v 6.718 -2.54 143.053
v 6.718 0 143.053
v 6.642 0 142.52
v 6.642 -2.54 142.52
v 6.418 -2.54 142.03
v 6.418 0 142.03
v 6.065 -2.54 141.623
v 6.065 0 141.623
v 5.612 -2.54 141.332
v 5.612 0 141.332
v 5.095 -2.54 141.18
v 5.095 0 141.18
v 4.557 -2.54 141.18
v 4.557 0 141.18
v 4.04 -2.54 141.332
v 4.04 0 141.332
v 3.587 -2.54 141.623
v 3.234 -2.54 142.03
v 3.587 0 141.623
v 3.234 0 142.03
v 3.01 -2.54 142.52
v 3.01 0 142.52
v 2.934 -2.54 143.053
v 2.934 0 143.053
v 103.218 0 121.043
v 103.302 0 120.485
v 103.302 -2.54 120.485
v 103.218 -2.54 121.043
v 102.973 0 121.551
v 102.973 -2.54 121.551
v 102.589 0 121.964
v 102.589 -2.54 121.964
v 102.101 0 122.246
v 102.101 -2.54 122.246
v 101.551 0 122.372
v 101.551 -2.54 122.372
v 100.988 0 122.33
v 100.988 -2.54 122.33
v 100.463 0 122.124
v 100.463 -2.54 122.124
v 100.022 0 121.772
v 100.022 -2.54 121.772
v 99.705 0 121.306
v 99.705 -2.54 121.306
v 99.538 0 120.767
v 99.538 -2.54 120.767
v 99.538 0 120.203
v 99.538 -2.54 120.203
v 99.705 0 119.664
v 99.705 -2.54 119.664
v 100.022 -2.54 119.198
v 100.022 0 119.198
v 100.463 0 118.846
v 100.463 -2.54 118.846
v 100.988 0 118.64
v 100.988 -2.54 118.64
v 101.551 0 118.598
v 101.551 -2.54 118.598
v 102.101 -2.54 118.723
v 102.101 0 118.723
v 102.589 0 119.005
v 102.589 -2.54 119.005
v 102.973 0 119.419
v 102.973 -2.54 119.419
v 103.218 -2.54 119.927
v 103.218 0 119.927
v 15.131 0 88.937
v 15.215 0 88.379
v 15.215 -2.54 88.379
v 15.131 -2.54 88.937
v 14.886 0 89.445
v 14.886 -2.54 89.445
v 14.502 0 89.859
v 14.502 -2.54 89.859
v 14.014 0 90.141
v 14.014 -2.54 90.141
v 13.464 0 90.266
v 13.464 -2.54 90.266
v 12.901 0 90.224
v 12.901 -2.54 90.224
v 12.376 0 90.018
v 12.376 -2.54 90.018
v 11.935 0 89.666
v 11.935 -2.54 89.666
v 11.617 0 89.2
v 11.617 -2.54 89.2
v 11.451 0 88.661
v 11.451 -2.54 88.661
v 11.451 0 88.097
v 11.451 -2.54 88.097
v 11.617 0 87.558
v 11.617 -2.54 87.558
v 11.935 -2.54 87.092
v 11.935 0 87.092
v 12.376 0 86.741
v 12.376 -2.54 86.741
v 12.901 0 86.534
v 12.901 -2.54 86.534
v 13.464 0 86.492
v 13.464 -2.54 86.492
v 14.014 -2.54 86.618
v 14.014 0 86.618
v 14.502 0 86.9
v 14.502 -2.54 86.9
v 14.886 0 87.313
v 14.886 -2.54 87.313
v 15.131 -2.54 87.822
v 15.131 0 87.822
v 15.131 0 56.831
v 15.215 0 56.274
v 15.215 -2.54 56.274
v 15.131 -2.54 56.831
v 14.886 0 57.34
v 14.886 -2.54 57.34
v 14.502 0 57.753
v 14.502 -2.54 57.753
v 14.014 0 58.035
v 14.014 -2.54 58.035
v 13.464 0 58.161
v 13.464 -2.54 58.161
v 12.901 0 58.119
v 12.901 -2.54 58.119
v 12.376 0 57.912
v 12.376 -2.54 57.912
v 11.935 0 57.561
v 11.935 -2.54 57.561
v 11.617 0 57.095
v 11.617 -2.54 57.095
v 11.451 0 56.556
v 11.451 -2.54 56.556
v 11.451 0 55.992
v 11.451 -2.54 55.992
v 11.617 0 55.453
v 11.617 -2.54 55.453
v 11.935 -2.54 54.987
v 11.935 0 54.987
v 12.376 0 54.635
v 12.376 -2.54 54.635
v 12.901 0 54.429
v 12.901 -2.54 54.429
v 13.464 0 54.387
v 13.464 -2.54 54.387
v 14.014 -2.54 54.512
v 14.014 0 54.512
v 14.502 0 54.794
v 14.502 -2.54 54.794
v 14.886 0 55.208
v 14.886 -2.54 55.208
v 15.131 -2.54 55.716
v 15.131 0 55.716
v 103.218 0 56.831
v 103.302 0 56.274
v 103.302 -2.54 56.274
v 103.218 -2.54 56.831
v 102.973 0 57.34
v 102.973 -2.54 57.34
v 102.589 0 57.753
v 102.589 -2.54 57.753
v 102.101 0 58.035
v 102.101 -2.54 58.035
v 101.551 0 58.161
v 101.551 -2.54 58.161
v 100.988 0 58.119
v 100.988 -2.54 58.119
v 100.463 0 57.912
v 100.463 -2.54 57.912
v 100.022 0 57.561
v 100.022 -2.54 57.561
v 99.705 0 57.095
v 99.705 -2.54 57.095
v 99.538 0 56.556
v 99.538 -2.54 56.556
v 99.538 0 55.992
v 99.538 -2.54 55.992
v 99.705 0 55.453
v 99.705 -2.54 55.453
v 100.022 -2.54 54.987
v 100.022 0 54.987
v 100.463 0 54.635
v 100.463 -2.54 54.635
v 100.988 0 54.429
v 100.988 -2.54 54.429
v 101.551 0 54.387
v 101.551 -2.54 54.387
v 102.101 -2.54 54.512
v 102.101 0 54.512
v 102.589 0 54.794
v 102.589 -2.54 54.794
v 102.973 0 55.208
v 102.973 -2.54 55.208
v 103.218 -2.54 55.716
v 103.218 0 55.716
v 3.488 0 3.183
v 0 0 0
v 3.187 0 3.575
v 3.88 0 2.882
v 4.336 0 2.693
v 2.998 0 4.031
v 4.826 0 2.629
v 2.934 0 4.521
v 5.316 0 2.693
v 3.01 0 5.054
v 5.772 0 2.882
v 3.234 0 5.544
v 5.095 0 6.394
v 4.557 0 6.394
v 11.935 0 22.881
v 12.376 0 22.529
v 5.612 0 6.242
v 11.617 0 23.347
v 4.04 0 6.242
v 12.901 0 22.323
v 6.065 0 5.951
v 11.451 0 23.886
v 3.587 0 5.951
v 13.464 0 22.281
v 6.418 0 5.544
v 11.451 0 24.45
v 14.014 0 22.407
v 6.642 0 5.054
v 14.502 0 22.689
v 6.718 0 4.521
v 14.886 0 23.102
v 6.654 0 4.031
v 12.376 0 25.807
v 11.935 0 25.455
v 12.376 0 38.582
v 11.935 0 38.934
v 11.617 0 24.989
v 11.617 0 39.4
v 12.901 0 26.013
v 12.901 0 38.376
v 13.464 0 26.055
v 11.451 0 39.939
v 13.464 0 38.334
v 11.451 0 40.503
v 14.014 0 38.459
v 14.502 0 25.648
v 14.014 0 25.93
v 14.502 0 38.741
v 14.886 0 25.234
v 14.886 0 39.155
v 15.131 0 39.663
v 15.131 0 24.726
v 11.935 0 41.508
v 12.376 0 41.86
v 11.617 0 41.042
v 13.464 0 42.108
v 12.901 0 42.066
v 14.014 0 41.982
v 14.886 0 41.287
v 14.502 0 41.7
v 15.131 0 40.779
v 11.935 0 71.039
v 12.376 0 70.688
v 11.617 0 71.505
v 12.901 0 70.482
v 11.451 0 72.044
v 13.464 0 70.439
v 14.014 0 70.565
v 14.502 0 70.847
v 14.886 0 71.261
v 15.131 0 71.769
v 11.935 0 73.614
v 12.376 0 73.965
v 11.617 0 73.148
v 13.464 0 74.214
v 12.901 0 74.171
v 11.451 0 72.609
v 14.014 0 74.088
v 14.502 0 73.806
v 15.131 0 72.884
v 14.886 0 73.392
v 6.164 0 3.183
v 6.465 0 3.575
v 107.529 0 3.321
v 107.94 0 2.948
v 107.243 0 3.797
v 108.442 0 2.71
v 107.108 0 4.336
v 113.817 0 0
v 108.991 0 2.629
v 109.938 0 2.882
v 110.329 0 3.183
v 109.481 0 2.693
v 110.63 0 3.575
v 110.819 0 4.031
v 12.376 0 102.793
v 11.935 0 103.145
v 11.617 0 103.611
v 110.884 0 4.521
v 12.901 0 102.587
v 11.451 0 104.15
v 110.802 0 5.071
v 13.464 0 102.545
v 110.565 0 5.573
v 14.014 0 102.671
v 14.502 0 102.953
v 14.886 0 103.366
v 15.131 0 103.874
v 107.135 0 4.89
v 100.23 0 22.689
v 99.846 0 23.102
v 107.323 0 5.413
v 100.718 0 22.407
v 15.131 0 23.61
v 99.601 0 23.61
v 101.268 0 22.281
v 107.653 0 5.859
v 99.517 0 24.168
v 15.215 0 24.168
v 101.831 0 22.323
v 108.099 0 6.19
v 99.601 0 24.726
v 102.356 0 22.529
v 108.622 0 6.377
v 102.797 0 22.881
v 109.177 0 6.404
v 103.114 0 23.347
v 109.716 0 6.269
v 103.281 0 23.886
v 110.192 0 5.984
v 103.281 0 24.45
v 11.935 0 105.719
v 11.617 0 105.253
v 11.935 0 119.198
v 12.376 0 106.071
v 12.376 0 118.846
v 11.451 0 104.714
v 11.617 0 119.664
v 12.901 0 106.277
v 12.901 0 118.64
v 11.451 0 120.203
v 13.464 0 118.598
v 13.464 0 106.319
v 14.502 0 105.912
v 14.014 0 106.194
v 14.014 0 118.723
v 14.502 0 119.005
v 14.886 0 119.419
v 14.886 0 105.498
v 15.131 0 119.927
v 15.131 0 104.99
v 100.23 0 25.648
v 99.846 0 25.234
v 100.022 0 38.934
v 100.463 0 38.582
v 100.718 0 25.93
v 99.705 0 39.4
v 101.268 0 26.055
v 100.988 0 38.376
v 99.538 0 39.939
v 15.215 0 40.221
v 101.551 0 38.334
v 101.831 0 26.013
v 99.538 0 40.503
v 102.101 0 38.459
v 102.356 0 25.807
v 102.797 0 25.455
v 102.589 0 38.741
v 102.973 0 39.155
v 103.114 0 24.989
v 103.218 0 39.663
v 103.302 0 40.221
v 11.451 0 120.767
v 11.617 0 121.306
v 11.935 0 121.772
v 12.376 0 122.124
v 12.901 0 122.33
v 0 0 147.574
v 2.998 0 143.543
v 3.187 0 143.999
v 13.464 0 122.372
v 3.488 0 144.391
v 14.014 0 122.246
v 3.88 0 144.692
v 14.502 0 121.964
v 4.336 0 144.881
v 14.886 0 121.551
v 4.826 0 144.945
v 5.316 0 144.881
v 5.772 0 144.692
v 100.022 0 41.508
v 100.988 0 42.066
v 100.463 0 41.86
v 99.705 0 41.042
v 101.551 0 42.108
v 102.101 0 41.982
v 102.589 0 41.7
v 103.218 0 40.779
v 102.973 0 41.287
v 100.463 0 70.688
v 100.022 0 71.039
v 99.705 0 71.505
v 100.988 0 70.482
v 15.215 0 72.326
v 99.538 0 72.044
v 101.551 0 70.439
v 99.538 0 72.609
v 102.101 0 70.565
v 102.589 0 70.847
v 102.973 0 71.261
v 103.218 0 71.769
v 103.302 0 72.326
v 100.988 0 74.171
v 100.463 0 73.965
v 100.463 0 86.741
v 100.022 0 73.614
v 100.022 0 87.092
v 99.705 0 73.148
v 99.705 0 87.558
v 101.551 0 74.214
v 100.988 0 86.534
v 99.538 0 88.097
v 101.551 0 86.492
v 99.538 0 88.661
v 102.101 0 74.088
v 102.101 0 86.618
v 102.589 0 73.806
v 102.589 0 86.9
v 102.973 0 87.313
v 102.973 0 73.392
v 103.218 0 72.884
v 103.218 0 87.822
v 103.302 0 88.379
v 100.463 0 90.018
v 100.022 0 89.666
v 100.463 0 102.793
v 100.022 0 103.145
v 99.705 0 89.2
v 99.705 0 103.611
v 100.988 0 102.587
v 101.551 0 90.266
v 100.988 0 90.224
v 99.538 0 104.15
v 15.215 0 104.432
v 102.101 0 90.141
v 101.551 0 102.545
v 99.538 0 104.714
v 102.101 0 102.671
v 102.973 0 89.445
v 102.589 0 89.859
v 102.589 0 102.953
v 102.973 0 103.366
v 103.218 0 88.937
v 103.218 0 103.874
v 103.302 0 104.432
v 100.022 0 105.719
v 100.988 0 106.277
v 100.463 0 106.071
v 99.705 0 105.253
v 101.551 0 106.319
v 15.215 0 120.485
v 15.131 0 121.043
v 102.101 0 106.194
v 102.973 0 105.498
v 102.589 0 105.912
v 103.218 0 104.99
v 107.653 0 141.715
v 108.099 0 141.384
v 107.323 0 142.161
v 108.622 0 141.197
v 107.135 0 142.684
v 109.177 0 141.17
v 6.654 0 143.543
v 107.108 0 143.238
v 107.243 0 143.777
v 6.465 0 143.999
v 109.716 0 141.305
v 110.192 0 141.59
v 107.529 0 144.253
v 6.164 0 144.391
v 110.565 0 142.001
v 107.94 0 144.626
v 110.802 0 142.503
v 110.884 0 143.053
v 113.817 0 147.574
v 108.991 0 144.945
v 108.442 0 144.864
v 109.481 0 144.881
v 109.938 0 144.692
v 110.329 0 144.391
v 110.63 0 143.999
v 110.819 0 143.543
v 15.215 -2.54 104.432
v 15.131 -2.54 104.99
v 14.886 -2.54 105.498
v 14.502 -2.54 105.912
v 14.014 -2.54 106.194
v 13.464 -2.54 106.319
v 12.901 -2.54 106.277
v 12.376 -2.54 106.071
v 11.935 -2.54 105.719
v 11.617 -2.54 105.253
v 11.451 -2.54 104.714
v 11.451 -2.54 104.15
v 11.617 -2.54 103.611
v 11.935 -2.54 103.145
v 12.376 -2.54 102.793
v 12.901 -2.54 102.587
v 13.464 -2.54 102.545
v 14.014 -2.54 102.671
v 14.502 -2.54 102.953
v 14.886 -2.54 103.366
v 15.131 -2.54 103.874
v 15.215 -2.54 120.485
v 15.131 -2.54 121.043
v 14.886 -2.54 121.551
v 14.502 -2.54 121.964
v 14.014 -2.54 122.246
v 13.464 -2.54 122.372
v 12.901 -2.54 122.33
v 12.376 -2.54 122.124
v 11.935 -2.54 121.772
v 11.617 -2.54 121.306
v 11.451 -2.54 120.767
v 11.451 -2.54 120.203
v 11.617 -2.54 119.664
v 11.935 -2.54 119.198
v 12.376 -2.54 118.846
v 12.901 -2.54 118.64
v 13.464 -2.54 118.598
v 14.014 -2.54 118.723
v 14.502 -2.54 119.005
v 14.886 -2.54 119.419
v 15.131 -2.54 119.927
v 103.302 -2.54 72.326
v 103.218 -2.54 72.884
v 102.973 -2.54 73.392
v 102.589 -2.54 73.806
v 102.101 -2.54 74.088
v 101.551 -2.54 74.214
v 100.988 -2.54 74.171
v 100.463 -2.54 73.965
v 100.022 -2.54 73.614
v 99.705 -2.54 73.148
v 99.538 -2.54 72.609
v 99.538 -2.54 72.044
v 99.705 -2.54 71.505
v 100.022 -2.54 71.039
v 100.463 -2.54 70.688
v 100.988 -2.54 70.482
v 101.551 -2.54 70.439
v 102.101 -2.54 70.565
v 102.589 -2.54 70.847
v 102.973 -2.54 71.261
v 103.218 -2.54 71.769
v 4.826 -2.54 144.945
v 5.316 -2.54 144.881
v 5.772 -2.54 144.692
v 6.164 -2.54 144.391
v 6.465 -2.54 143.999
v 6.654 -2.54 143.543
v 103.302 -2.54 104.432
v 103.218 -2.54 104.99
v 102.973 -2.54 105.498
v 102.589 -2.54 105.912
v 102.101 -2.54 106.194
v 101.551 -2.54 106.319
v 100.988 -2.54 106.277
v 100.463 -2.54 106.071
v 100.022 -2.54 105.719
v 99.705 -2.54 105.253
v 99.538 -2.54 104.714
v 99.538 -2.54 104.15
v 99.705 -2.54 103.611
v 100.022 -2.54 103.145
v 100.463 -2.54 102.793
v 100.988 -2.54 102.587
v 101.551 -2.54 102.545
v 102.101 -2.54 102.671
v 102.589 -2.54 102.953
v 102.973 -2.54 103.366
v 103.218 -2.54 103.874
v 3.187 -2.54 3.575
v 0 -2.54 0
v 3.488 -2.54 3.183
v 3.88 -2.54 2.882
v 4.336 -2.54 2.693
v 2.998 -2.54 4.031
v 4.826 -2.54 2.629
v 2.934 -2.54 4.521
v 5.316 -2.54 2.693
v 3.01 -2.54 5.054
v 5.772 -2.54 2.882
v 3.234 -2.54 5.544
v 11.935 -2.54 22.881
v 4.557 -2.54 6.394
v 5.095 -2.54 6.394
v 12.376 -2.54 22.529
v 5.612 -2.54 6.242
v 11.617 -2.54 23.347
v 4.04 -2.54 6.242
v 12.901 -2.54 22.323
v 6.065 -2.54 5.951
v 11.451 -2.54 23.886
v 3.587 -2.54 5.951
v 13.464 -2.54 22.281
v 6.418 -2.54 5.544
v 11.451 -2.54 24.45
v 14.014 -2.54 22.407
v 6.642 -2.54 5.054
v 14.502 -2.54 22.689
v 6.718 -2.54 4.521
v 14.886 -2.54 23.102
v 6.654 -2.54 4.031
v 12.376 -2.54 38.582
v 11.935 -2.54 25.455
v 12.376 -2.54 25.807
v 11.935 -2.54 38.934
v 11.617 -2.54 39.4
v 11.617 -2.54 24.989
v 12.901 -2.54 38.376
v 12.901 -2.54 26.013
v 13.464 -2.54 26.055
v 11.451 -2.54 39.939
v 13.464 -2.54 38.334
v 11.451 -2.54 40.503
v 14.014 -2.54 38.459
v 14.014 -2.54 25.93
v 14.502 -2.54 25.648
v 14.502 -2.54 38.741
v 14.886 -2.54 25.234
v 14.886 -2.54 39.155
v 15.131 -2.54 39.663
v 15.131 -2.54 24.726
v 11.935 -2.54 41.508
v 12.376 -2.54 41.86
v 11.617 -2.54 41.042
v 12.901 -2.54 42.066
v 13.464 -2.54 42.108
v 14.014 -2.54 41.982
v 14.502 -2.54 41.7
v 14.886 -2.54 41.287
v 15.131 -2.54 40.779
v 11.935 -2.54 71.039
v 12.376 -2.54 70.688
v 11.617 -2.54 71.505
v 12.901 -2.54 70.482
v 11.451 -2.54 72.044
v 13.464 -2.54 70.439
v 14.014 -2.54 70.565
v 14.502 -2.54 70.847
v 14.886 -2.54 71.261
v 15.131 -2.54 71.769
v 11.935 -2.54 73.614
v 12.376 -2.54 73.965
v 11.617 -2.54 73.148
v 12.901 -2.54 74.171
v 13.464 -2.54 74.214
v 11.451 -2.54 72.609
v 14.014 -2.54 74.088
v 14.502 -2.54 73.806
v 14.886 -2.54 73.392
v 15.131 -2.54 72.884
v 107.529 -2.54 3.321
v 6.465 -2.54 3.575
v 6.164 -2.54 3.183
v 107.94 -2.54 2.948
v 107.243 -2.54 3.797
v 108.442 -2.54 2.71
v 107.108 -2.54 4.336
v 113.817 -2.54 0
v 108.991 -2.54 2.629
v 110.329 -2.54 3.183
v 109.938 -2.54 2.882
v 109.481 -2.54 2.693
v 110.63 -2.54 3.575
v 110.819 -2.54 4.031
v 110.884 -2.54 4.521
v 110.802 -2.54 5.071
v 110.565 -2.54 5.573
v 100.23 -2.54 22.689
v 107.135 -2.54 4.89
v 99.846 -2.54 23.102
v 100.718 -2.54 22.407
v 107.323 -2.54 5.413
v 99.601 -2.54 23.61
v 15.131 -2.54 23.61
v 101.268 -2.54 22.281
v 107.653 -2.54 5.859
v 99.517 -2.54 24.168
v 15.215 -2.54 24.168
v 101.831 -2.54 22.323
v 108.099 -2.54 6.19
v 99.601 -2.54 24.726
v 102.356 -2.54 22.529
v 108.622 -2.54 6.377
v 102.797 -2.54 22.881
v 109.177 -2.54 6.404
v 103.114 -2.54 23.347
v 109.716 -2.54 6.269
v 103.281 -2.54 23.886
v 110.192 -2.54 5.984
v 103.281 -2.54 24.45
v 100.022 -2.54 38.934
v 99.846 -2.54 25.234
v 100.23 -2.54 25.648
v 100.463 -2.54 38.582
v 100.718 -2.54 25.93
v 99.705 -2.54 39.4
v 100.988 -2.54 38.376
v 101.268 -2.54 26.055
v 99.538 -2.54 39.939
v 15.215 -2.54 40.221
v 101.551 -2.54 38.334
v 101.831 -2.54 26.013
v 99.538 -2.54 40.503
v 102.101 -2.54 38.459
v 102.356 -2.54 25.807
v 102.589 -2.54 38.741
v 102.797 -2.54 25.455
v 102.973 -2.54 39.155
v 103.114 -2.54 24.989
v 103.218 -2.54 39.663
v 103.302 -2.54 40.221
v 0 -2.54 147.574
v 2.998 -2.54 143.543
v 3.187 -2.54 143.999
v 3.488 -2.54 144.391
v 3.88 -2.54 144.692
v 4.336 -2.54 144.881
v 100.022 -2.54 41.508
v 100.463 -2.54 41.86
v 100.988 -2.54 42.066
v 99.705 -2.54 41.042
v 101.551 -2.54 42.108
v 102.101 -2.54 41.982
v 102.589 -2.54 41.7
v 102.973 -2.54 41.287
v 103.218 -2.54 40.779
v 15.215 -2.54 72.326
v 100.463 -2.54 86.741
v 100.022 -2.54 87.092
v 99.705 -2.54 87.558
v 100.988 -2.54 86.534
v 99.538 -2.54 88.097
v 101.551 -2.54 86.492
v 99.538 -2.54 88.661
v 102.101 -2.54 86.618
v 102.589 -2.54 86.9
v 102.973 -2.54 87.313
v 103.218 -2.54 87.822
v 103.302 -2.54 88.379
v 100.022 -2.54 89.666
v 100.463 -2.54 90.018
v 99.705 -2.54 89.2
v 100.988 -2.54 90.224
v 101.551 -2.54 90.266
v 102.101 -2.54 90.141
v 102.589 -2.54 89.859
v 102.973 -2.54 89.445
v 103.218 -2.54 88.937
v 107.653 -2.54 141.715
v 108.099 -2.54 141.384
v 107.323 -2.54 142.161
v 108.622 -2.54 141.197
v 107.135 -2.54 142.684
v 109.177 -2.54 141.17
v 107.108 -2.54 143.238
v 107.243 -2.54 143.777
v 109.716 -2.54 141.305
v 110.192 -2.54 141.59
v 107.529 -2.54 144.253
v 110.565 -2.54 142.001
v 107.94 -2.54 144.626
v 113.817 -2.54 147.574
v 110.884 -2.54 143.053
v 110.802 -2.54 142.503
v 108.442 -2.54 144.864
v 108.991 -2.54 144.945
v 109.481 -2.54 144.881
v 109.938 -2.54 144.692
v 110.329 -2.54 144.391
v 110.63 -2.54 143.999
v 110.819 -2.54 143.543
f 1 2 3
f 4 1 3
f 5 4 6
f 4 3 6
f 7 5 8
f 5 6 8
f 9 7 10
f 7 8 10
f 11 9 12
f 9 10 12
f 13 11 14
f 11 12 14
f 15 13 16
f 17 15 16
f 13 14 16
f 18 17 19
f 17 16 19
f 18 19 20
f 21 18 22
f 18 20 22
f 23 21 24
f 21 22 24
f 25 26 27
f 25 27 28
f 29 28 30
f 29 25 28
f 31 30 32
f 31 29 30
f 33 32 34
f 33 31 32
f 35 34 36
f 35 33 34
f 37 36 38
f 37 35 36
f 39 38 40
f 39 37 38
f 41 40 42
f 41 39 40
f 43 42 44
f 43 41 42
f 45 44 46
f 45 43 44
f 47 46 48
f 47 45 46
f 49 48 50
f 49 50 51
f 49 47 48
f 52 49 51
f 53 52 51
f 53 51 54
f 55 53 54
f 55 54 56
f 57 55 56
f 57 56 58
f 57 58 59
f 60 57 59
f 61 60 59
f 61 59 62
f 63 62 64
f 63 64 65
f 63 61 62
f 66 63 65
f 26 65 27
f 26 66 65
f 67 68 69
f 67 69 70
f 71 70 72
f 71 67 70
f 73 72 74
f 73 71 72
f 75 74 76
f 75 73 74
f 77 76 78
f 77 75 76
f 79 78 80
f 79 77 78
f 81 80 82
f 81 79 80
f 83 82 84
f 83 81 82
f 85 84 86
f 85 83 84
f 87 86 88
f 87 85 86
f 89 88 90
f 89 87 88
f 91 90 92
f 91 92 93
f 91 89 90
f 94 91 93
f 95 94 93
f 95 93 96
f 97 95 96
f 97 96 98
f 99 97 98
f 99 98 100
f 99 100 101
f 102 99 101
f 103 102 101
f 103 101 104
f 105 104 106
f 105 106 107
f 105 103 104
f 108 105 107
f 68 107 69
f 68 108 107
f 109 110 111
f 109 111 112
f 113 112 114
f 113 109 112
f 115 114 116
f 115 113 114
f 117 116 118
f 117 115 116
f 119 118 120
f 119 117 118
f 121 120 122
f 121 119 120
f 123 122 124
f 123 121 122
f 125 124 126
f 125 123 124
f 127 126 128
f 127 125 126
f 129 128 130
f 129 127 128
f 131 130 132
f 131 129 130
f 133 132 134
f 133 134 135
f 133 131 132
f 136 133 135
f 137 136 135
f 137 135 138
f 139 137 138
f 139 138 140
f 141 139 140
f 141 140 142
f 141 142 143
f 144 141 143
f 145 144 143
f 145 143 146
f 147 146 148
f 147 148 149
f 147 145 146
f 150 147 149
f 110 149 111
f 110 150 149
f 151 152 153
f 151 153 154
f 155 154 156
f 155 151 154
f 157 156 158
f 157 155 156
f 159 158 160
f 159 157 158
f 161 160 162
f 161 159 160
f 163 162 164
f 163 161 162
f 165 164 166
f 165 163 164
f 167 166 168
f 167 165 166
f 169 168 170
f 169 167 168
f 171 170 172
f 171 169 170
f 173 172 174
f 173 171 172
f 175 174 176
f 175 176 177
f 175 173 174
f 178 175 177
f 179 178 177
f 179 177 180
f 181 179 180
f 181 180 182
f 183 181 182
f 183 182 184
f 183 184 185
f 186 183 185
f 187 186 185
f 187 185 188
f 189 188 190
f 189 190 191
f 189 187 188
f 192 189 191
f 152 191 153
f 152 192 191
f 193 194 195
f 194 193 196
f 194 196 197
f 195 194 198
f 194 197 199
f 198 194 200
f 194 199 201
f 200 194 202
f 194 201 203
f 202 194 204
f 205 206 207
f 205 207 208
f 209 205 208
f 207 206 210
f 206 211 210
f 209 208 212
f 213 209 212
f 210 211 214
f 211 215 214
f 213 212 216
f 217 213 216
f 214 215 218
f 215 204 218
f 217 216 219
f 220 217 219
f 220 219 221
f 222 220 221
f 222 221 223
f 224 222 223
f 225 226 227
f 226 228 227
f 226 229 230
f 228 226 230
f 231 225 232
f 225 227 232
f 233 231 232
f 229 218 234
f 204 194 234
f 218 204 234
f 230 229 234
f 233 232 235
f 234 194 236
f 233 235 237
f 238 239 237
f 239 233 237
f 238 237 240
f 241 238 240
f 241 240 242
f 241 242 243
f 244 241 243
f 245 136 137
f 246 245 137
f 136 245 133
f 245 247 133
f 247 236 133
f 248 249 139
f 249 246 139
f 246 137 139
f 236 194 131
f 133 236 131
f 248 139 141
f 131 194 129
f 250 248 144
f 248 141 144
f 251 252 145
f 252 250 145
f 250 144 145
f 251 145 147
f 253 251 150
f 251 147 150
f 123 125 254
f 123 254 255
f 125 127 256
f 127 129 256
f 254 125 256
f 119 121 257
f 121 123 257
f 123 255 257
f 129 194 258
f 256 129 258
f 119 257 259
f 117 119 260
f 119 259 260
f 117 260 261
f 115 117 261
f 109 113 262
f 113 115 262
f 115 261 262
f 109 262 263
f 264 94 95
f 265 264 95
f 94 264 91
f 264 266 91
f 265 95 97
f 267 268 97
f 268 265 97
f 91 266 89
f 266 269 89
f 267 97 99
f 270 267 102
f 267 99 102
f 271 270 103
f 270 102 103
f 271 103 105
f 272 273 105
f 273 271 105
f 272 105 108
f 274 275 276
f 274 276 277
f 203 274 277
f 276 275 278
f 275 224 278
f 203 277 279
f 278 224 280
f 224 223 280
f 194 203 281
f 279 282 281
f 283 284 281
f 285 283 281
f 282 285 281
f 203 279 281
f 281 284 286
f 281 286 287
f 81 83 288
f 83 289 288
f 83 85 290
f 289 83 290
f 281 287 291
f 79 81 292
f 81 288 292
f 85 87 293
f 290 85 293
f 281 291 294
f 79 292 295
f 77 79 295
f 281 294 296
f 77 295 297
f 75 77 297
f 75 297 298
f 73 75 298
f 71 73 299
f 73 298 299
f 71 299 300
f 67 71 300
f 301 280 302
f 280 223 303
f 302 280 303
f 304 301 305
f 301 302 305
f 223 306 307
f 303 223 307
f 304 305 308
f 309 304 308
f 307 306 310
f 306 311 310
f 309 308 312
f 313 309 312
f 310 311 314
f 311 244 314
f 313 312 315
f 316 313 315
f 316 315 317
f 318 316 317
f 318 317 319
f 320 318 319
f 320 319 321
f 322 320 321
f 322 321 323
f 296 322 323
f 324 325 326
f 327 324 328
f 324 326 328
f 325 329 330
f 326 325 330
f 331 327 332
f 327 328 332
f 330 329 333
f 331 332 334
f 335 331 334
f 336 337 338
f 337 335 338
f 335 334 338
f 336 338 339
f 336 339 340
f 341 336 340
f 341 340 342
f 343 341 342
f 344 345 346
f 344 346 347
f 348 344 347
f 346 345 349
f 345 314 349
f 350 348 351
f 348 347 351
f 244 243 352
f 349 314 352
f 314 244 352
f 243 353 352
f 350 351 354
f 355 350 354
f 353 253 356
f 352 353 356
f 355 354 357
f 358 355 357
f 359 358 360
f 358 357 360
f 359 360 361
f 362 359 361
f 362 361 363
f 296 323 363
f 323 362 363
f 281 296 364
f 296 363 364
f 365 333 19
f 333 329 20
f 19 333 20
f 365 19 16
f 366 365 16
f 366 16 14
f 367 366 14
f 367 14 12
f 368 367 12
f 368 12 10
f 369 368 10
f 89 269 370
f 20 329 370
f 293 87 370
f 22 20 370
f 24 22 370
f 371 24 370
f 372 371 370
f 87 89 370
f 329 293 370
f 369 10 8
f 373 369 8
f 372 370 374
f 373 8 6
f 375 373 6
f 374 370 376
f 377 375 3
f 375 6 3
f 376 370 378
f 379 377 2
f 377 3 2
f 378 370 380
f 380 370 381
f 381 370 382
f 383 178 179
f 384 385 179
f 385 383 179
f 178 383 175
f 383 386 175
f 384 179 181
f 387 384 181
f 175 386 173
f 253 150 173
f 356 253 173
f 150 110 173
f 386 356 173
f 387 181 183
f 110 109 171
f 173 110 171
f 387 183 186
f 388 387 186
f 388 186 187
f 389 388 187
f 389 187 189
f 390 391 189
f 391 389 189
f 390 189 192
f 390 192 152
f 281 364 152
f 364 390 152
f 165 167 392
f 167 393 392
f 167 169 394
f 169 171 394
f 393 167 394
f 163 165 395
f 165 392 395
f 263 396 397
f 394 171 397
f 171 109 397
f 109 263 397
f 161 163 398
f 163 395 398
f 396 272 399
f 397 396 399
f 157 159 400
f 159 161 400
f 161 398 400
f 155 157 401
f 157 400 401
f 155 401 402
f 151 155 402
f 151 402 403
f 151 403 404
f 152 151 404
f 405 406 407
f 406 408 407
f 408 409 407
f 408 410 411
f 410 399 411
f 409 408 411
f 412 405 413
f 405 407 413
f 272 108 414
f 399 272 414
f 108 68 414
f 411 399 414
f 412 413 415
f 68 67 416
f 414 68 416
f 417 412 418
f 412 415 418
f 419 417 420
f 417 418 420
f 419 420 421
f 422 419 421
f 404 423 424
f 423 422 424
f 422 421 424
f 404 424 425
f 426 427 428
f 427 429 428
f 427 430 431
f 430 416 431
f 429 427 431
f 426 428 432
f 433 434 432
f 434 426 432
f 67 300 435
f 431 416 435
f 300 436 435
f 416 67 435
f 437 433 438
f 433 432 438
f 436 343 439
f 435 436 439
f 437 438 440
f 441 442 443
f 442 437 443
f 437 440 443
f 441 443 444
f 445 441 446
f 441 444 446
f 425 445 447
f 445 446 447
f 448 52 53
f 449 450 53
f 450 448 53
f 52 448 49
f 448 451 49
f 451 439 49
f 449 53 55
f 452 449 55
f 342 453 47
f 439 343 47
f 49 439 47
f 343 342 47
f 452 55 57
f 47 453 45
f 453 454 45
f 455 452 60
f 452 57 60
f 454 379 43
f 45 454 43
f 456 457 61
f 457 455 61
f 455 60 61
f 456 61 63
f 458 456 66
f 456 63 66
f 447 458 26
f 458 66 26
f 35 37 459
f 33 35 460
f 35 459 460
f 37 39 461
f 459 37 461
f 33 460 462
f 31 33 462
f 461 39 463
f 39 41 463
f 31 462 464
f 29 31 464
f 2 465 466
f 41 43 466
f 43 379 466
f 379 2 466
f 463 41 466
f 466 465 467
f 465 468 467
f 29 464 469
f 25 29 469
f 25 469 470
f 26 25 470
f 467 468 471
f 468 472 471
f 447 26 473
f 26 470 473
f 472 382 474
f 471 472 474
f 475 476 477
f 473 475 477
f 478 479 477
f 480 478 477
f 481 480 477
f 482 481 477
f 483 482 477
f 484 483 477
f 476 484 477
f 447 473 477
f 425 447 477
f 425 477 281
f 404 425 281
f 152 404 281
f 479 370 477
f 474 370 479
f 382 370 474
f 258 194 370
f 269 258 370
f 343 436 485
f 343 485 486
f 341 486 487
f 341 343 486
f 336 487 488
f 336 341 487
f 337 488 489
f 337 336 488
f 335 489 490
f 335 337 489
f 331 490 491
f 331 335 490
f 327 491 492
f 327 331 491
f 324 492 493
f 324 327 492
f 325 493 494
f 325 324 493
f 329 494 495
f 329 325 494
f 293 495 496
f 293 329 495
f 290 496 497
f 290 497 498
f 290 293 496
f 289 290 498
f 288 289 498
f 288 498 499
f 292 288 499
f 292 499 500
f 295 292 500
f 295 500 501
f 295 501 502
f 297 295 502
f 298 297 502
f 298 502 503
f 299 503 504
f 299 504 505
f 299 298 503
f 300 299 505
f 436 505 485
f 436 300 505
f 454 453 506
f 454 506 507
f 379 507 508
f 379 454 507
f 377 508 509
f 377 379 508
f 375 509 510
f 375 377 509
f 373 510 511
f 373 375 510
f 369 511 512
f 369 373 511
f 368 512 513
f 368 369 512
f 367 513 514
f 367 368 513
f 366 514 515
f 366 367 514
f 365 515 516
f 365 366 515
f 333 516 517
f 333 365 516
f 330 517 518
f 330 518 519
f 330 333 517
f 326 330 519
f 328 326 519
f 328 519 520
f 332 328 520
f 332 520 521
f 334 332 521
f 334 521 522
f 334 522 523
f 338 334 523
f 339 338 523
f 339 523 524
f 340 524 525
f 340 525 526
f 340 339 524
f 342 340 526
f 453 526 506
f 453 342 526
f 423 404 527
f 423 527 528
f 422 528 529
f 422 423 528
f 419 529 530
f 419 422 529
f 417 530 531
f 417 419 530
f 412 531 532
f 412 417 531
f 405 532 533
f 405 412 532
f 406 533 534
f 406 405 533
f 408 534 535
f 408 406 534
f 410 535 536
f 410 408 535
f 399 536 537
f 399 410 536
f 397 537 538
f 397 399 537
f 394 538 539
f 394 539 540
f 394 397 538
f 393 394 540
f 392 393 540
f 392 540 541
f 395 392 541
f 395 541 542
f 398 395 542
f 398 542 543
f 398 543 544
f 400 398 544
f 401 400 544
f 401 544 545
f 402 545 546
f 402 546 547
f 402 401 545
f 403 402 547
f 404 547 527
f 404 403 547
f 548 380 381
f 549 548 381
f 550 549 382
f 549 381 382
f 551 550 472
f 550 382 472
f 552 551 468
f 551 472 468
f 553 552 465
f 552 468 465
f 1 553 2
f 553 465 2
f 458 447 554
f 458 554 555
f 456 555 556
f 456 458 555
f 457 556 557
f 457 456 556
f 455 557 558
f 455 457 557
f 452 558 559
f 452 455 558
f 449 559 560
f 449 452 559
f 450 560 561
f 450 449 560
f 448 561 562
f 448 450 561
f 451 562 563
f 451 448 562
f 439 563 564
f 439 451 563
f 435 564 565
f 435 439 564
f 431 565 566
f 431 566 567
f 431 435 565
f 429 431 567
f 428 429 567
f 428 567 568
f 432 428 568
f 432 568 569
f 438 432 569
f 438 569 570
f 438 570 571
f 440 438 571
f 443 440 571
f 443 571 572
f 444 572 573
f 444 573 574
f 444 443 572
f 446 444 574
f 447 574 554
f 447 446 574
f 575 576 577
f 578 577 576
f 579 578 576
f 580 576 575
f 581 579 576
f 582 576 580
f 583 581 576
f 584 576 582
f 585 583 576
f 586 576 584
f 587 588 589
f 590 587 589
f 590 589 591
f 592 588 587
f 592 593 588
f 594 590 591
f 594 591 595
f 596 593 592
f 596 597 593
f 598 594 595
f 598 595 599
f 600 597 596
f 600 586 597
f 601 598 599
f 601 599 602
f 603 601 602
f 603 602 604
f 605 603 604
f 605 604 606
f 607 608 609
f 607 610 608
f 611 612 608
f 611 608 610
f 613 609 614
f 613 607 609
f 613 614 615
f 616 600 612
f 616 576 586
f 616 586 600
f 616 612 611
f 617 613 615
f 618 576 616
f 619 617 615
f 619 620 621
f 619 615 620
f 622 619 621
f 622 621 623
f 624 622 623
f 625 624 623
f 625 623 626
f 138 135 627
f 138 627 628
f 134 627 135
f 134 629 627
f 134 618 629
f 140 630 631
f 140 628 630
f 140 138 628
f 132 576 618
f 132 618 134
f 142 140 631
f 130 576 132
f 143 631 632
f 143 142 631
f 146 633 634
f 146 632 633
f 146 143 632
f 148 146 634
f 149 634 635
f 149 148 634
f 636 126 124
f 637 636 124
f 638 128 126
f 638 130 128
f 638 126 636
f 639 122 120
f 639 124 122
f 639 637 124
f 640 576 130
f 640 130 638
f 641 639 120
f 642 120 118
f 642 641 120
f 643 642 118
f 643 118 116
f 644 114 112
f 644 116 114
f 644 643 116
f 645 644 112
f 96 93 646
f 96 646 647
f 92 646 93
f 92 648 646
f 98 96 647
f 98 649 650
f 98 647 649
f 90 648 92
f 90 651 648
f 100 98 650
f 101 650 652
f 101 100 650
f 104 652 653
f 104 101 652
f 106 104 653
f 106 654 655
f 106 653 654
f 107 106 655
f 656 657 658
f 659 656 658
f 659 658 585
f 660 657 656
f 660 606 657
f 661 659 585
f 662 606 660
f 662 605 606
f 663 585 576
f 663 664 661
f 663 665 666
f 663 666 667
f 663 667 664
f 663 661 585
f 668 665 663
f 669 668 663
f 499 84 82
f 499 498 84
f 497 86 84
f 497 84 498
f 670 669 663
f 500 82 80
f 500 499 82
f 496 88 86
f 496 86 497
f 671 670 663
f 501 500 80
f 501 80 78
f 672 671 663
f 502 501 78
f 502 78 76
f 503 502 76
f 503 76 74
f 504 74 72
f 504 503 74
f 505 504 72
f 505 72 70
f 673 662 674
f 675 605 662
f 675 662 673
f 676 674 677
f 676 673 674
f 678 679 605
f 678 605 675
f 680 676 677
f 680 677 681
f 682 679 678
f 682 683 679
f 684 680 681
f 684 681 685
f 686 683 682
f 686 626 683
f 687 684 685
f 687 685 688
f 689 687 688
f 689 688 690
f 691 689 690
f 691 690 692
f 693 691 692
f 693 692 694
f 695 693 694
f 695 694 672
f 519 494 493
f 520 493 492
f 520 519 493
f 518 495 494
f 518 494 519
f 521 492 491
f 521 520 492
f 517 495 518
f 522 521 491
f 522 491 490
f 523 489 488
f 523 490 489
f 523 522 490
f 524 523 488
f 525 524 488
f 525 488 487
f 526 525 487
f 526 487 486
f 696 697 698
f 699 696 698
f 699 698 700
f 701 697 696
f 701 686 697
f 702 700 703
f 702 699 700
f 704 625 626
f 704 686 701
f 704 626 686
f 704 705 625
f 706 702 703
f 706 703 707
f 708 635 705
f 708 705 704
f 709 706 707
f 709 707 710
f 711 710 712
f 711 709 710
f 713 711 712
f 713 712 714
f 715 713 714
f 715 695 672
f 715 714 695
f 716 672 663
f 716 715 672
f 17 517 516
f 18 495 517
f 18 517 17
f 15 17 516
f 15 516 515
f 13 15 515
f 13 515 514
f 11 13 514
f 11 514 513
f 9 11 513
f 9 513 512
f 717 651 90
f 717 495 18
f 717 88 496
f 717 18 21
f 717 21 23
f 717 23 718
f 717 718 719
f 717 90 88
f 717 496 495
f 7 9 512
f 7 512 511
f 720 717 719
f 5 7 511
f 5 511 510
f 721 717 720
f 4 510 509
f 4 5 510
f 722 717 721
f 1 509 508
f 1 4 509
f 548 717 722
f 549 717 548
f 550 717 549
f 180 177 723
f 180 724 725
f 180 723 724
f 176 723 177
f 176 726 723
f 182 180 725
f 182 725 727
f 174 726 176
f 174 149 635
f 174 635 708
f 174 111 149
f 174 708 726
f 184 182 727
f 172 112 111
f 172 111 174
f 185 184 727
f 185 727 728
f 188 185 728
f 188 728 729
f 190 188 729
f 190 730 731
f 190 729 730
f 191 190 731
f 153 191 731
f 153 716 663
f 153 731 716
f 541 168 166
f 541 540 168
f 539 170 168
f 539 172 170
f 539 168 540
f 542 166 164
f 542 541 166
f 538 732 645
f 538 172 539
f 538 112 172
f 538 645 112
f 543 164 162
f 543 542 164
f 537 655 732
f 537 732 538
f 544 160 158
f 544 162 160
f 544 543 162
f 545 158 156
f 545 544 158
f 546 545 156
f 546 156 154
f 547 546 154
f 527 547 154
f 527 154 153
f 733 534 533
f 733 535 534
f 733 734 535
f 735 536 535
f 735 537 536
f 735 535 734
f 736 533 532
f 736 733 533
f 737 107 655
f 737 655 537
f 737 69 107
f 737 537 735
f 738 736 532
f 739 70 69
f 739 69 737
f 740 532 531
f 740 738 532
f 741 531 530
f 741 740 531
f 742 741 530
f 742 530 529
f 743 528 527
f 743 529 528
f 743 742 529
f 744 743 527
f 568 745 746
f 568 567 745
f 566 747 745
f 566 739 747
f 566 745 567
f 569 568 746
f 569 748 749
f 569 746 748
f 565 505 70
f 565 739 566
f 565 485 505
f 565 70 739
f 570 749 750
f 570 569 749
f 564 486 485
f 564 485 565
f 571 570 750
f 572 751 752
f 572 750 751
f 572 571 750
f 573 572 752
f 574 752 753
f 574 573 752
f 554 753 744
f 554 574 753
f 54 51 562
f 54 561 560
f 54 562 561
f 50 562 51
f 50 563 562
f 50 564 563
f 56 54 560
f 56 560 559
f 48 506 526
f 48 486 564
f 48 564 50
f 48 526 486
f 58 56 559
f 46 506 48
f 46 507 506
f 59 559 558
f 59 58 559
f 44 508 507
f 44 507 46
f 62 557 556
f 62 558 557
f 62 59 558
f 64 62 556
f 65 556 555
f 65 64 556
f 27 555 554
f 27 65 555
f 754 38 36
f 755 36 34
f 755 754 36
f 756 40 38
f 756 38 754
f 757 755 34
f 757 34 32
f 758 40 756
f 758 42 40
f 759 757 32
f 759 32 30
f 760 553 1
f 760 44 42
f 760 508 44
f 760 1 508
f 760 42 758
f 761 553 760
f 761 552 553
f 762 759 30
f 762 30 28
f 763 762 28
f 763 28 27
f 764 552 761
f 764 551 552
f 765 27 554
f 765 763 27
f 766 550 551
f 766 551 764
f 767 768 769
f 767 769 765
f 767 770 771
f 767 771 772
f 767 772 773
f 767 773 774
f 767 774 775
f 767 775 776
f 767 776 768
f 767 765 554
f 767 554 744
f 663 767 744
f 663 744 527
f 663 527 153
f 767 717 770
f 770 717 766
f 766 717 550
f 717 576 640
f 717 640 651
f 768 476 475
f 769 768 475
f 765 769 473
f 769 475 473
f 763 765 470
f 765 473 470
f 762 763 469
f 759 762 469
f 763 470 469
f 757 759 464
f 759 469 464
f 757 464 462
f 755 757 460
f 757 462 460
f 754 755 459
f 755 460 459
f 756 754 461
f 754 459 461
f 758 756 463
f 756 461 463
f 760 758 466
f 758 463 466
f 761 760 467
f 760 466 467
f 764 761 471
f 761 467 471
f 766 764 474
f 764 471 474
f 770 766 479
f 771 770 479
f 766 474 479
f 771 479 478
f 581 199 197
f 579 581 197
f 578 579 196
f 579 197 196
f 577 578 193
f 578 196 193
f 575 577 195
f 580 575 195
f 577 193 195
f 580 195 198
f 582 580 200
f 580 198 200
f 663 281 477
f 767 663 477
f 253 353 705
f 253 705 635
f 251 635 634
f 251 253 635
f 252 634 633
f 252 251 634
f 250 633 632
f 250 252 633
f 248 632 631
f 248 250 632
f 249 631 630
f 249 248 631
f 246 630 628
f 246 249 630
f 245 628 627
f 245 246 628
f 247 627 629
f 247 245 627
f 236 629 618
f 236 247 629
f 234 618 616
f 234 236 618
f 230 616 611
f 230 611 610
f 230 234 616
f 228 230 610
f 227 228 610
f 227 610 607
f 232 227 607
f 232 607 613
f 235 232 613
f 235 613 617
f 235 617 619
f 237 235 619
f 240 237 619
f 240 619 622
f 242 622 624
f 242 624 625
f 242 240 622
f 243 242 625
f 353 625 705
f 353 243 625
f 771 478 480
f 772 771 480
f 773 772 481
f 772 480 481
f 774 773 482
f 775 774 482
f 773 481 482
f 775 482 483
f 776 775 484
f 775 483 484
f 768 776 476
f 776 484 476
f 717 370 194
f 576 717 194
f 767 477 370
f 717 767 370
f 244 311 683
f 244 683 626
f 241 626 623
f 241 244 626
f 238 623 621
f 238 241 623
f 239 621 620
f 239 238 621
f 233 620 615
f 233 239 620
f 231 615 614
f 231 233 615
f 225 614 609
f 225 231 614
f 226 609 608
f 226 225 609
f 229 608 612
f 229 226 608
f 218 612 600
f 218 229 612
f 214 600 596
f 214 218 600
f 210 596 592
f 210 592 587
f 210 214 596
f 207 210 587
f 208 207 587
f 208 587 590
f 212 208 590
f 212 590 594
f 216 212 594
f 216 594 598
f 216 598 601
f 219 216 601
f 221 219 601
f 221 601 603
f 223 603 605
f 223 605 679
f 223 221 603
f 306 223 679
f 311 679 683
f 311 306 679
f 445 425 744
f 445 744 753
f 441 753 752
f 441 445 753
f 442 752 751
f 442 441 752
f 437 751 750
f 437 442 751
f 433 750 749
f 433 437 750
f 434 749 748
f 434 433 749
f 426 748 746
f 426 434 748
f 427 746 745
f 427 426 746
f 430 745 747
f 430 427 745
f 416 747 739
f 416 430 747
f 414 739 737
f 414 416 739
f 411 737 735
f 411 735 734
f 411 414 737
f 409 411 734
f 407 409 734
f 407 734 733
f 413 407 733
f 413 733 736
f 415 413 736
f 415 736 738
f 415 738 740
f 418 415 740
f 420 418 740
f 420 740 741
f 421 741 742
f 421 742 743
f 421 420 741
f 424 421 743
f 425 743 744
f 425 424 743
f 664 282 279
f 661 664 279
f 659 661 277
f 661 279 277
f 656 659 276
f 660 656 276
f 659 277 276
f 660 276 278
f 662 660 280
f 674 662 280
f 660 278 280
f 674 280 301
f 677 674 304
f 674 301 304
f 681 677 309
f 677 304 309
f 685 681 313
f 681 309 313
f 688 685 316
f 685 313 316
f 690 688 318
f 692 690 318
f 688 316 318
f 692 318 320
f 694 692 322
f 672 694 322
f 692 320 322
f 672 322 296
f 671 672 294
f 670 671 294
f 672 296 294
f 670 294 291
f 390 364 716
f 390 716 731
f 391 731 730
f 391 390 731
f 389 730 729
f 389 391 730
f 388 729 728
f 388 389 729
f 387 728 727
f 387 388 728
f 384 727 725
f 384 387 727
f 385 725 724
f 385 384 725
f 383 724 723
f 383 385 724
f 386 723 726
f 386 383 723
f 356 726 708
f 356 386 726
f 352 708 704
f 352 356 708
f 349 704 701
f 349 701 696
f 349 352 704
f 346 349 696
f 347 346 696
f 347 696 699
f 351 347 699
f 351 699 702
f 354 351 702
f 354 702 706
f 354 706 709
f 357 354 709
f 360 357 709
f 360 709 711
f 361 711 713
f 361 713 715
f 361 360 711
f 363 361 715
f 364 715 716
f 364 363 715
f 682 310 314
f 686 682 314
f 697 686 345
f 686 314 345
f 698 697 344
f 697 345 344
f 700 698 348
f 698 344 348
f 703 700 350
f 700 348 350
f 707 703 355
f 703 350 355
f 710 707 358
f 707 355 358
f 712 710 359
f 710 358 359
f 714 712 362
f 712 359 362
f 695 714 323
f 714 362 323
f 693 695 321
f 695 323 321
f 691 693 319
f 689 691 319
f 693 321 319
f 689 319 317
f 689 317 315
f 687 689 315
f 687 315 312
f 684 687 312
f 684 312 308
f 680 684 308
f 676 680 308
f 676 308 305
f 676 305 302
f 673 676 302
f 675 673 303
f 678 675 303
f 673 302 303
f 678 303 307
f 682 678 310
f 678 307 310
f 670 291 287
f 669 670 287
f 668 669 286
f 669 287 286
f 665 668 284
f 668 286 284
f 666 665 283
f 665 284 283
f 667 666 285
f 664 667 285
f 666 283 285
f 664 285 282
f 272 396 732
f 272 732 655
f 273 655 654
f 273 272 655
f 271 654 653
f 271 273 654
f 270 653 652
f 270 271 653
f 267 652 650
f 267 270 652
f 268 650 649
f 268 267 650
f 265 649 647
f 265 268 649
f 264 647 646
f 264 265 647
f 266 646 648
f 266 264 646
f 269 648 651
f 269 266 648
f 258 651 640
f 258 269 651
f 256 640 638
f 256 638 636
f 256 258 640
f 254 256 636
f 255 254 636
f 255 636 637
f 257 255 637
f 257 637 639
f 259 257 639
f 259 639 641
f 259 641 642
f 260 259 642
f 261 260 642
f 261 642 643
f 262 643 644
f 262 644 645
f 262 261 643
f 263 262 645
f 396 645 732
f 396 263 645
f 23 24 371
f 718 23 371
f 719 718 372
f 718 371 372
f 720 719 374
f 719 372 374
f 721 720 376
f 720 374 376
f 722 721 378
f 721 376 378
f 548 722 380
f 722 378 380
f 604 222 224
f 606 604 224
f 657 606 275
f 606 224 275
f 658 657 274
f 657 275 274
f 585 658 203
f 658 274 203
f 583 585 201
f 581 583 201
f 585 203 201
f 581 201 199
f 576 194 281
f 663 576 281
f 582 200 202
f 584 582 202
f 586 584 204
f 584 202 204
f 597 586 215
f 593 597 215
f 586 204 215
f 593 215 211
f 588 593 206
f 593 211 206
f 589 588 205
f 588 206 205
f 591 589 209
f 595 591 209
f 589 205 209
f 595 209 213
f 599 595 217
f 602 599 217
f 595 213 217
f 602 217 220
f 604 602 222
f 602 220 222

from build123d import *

# Parameters (mm, degrees)
F0_R     = 1.8923
F1_DEPTH = 2.54


with BuildPart() as f1:
    # F0 (on Front) → F1 (new body)
    with BuildSketch(Plane.XZ):
        with BuildLine():
            Line((0, 4.5212), (0, 0))
            Line((0, 0), (4.826, 0))
            Line((4.826, 0), (4.826, 2.6289))
            ThreePointArc((4.826, 2.6289), (3.487941838, 3.183141838), (2.9337, 4.5212))
            Line((2.9337, 4.5212), (0, 4.5212))
        make_face()
        with BuildLine():
            Line((4.826, 2.6289), (4.826, 0))
            Line((4.826, 0), (108.9914, 0))
            Line((108.9914, 0), (108.9914, 2.6289))
            ThreePointArc((108.9914, 2.6289), (107.653341838, 5.859258162), (110.8837, 4.5212))
            Line((110.8837, 4.5212), (113.8174, 4.5212))
            Line((113.8174, 4.5212), (113.8174, 143.0528))
            Line((113.8174, 143.0528), (110.8837, 143.0528))
            ThreePointArc((110.8837, 143.0528), (107.653341838, 141.714741838), (108.9914, 144.9451))
            Line((108.9914, 144.9451), (108.9914, 147.574))
            Line((108.9914, 147.574), (4.826, 147.574))
            Line((4.826, 147.574), (4.826, 144.9451))
            ThreePointArc((4.826, 144.9451), (6.164058162, 144.390858162), (6.7183, 143.0528))
            ThreePointArc((6.7183, 143.0528), (4.826, 141.1605), (2.9337, 143.0528))
            Line((2.9337, 143.0528), (0, 143.0528))
            Line((0, 143.0528), (0, 4.5212))
            Line((0, 4.5212), (2.9337, 4.5212))
            ThreePointArc((2.9337, 4.5212), (4.826, 6.4135), (6.7183, 4.5212))
            ThreePointArc((6.7183, 4.5212), (6.164058162, 3.183141838), (4.826, 2.6289))
        make_face()
        with Locations((13.3223, 24.1681)):
            Circle(F0_R, mode=Mode.SUBTRACT)
        with Locations((13.3223, 40.2209)):
            Circle(F0_R, mode=Mode.SUBTRACT)
        with Locations((13.3223, 56.2737)):
            Circle(F0_R, mode=Mode.SUBTRACT)
        with Locations((13.3223, 72.3265)):
            Circle(F0_R, mode=Mode.SUBTRACT)
        with BuildLine():
            ThreePointArc((103.3018, 24.1681), (101.4095, 22.2758), (99.5172, 24.1681))
            ThreePointArc((99.5172, 24.1681), (101.4095, 26.0604), (103.3018, 24.1681))
        make_face(mode=Mode.SUBTRACT)
        with Locations((101.4095, 40.2209)):
            Circle(F0_R, mode=Mode.SUBTRACT)
        with Locations((101.4095, 56.2737)):
            Circle(F0_R, mode=Mode.SUBTRACT)
        with Locations((101.4095, 72.3265)):
            Circle(F0_R, mode=Mode.SUBTRACT)
        with Locations((13.3223, 88.3793)):
            Circle(F0_R, mode=Mode.SUBTRACT)
        with Locations((13.3223, 104.4321)):
            Circle(F0_R, mode=Mode.SUBTRACT)
        with Locations((13.3223, 120.4849)):
            Circle(F0_R, mode=Mode.SUBTRACT)
        with Locations((101.4095, 88.3793)):
            Circle(F0_R, mode=Mode.SUBTRACT)
        with Locations((101.4095, 104.4321)):
            Circle(F0_R, mode=Mode.SUBTRACT)
        with Locations((101.4095, 120.4849)):
            Circle(F0_R, mode=Mode.SUBTRACT)
        with BuildLine():
            Line((108.9914, 2.6289), (108.9914, 0))
            Line((108.9914, 0), (113.8174, 0))
            Line((113.8174, 0), (113.8174, 4.5212))
            Line((113.8174, 4.5212), (110.8837, 4.5212))
            ThreePointArc((110.8837, 4.5212), (110.329458162, 3.183141838), (108.9914, 2.6289))
        make_face()
        with BuildLine():
            Line((0, 147.574), (0, 143.0528))
            Line((0, 143.0528), (2.9337, 143.0528))
            ThreePointArc((2.9337, 143.0528), (3.487941838, 144.390858162), (4.826, 144.9451))
            Line((4.826, 144.9451), (4.826, 147.574))
            Line((4.826, 147.574), (0, 147.574))
        make_face()
        with BuildLine():
            Line((110.8837, 143.0528), (113.8174, 143.0528))
            Line((113.8174, 143.0528), (113.8174, 147.574))
            Line((113.8174, 147.574), (108.9914, 147.574))
            Line((108.9914, 147.574), (108.9914, 144.9451))
            ThreePointArc((108.9914, 144.9451), (110.329458162, 144.390858162), (110.8837, 143.0528))
        make_face()
    extrude(amount=F1_DEPTH)


solid = f1.part
